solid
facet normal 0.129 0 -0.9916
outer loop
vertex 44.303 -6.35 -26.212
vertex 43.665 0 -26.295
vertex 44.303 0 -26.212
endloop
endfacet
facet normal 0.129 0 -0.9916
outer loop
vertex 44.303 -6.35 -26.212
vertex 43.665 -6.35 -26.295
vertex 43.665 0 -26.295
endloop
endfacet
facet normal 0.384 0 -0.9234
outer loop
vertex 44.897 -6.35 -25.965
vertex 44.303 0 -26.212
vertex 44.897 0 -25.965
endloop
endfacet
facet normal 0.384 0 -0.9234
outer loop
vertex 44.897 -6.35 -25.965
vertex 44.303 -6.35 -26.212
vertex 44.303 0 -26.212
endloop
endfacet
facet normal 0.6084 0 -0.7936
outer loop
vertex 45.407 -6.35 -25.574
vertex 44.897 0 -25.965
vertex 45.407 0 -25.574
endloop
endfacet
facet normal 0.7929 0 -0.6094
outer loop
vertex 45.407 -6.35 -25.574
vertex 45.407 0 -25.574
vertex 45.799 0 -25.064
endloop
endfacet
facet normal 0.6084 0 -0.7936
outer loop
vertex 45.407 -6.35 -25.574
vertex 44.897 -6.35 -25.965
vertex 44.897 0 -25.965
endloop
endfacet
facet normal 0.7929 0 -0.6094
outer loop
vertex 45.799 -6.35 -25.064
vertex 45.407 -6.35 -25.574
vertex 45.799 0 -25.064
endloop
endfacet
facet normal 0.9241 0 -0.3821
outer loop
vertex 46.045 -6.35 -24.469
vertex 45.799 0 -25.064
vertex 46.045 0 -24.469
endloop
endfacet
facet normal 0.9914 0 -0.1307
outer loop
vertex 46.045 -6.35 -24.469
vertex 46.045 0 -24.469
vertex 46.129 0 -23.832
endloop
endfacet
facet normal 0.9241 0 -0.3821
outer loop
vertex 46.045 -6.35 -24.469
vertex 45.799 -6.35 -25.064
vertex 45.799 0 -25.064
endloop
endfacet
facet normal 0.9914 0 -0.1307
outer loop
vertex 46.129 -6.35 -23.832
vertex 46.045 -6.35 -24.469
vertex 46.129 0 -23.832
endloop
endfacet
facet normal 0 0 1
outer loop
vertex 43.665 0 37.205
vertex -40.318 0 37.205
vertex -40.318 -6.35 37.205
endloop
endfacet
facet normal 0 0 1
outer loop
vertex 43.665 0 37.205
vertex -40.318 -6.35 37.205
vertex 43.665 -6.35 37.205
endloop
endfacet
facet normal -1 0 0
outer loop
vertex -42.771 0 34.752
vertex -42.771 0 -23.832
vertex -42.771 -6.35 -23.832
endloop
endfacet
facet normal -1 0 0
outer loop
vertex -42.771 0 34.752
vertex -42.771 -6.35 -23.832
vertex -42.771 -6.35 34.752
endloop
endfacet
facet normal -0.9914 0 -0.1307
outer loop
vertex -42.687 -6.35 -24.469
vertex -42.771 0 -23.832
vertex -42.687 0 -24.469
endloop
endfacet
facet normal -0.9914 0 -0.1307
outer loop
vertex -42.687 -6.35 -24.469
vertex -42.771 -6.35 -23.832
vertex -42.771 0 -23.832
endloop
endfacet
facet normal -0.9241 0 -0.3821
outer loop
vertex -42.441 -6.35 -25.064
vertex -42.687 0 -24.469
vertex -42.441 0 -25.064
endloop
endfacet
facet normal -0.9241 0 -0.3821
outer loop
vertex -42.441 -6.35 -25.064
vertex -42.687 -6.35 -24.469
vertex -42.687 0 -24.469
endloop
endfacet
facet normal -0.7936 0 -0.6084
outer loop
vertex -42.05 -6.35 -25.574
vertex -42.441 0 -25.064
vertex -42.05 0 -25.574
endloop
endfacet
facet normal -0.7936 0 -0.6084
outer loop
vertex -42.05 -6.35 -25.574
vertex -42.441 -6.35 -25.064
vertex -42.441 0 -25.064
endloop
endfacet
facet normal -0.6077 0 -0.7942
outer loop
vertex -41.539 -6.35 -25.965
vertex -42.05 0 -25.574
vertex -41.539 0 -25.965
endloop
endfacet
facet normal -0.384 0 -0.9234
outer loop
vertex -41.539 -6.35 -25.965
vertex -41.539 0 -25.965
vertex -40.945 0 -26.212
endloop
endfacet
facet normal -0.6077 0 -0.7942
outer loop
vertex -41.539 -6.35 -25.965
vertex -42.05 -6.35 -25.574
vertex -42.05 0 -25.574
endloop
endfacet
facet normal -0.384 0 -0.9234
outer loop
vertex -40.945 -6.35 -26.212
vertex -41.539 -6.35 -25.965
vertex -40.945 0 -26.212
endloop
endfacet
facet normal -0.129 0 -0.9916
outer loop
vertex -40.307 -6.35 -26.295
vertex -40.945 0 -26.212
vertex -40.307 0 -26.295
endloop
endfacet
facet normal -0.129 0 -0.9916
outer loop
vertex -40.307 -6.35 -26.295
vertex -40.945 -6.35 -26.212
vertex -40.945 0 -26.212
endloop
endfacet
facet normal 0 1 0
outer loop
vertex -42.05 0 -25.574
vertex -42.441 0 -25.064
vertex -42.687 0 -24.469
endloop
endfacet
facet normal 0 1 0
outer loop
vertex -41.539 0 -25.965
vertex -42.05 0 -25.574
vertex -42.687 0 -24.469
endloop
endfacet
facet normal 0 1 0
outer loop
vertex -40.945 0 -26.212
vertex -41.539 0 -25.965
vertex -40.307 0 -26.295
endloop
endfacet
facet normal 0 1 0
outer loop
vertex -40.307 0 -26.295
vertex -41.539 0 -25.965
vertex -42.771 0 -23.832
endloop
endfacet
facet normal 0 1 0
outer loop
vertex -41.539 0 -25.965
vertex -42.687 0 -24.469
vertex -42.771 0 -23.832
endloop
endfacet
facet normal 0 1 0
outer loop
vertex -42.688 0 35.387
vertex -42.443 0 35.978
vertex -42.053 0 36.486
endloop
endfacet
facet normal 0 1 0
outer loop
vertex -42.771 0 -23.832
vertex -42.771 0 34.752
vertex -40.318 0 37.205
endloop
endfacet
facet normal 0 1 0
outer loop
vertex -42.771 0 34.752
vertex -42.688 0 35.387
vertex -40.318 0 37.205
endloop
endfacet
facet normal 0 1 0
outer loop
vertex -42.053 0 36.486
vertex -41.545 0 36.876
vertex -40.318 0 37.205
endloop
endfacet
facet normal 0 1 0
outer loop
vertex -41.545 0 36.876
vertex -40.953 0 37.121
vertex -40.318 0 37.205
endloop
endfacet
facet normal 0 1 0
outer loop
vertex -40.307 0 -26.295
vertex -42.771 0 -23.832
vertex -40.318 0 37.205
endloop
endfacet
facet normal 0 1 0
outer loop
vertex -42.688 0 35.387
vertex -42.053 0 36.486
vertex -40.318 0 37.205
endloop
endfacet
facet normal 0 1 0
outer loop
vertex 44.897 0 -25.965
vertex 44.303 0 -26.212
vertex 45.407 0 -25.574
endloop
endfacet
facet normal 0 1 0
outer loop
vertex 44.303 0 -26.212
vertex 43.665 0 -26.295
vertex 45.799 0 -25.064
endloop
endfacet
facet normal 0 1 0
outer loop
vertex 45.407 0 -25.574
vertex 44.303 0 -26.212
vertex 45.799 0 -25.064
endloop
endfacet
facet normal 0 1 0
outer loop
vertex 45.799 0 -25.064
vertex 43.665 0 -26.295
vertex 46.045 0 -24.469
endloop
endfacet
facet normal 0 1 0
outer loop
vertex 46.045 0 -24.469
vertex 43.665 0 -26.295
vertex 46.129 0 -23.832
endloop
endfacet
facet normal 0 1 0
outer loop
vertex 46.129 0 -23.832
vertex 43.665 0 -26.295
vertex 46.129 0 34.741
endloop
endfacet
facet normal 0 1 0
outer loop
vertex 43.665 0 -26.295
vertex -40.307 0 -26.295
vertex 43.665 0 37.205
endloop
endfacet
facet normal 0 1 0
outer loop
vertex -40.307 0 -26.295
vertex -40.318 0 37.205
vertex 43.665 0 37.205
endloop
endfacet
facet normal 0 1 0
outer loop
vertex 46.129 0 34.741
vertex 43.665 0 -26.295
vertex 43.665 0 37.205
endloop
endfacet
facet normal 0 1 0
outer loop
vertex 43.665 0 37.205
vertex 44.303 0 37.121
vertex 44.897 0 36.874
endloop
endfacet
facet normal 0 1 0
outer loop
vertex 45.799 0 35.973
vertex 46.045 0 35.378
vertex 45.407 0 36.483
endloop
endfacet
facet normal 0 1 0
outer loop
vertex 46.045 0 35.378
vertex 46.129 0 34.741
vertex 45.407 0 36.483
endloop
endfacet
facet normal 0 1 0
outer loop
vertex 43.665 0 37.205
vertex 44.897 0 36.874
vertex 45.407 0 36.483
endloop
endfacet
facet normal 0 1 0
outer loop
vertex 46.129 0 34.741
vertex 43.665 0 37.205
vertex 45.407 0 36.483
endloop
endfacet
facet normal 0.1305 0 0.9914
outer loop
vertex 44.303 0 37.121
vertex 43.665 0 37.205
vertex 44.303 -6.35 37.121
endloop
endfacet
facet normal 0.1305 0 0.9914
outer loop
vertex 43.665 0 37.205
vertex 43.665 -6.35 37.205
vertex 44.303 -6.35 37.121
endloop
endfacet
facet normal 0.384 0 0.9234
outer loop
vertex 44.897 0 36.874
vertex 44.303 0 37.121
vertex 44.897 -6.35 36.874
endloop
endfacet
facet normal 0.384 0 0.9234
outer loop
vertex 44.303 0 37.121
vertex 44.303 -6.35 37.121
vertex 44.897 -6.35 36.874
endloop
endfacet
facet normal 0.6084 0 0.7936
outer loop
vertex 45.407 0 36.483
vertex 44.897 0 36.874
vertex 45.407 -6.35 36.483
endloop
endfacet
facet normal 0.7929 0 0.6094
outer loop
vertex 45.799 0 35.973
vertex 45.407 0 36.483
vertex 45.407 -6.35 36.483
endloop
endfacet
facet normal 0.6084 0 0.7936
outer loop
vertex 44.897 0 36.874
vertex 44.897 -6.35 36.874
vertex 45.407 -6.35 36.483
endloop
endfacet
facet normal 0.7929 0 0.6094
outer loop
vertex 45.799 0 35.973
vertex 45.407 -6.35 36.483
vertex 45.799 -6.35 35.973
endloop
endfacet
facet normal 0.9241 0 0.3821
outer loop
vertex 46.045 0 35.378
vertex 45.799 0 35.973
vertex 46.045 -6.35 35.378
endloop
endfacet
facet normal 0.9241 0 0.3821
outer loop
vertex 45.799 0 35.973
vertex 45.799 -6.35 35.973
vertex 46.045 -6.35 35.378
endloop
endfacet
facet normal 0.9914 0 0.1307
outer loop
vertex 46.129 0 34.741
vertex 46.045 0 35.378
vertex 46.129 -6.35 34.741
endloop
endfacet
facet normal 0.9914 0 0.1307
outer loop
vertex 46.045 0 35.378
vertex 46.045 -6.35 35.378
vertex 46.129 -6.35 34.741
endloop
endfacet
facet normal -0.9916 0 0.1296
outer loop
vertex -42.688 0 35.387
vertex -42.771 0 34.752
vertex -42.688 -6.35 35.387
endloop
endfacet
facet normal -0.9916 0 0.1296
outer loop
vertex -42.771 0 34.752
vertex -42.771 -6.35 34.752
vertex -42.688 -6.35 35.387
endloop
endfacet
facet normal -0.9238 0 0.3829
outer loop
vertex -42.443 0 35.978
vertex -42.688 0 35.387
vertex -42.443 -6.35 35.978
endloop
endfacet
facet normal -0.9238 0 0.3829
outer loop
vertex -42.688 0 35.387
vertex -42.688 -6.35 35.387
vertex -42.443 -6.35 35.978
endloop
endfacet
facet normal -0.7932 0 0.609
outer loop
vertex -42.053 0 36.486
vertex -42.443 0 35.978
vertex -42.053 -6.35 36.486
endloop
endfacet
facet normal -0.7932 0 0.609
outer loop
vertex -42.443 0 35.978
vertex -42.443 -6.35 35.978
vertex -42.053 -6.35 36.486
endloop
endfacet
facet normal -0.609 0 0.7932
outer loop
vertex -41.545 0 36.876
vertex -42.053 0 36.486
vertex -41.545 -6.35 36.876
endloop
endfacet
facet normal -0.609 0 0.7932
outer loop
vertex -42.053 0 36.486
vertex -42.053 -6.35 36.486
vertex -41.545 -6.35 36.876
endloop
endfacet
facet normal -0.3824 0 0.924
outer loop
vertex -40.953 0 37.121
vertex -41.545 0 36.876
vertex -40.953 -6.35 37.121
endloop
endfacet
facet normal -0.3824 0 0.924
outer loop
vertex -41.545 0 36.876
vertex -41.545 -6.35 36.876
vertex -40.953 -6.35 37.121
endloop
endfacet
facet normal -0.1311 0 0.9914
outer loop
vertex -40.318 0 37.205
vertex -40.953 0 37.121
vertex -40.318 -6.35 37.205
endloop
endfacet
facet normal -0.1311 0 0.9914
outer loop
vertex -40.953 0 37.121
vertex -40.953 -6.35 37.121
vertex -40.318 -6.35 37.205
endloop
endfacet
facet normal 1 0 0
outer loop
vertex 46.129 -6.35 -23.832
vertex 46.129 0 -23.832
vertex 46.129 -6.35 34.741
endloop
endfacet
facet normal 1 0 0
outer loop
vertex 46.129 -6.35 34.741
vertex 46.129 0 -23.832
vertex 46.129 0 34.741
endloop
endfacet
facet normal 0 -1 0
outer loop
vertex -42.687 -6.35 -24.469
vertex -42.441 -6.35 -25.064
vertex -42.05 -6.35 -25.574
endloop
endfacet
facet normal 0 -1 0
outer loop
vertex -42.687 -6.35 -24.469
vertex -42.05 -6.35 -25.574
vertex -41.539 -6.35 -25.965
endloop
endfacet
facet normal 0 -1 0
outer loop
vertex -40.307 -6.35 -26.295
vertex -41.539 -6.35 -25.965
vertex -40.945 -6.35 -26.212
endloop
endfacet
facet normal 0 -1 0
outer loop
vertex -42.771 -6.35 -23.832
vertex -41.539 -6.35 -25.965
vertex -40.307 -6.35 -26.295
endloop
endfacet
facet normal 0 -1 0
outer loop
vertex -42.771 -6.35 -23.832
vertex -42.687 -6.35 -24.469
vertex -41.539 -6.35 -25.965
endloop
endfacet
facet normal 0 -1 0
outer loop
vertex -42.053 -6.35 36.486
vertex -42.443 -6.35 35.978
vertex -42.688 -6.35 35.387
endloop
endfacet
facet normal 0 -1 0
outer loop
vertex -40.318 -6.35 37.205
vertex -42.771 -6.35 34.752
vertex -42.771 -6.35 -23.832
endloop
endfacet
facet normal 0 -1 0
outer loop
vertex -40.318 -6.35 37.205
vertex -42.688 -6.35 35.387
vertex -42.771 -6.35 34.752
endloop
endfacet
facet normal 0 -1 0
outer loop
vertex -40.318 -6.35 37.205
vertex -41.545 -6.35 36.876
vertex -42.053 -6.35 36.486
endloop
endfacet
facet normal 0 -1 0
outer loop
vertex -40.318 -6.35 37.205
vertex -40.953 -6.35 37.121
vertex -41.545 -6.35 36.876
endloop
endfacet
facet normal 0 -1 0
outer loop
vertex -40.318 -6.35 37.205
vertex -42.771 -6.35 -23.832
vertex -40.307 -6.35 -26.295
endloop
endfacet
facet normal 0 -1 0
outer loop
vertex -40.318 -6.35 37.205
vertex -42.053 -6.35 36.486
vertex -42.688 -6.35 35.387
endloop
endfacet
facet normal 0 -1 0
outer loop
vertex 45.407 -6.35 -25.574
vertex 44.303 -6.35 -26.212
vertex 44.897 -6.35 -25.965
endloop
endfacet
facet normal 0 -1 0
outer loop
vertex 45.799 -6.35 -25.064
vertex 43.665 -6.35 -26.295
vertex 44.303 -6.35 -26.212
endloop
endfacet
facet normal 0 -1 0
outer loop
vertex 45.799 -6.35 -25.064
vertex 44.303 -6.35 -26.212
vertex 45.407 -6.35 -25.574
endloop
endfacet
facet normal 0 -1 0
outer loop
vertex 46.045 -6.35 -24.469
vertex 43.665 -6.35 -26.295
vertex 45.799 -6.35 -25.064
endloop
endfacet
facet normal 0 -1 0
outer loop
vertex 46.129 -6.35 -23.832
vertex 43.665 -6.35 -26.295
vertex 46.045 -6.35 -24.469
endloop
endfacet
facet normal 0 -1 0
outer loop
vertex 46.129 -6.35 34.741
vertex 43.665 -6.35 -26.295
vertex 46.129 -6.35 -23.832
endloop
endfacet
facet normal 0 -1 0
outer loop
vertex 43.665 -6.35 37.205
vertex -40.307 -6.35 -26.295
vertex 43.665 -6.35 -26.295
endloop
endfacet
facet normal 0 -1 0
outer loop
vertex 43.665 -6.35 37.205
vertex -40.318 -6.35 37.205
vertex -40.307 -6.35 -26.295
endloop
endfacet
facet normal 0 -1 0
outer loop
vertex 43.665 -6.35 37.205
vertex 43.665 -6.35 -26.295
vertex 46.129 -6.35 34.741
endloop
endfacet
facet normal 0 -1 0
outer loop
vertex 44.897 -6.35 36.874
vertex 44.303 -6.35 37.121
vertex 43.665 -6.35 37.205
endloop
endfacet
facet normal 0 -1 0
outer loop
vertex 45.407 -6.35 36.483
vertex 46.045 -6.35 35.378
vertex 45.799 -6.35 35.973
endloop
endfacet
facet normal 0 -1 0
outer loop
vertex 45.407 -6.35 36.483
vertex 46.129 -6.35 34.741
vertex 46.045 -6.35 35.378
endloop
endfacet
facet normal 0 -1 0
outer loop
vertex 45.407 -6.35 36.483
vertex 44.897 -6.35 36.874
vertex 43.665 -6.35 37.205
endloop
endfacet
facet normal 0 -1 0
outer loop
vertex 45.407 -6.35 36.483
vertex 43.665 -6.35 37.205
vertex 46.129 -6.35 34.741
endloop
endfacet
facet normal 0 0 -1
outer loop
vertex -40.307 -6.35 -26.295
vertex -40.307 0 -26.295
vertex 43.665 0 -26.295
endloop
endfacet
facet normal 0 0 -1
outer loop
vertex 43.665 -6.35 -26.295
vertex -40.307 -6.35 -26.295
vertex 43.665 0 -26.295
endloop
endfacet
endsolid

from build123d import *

# Parameters (mm, degrees)
F0_W     = 88.9
F0_H     = 63.5
F1_DEPTH = 6.35
F2_R     = 2.452841
F3_R     = 2.4638


with BuildPart() as f1:
    # F0 (on Front) → F1 (new body)
    with BuildSketch(Plane.XZ):
        with Locations((1.678722, 5.454515)):
            Rectangle(F0_W, F0_H)
    extrude(amount=F1_DEPTH)

    # F2
    f2_edges = [f1.edges().sort_by_distance(p)[0] for p in [
        (-42.771278, -3.175, 37.204515),
    ]]
    fillet(f2_edges, radius=F2_R)

    # F3
    f3_edges = [f1.edges().sort_by_distance(p)[0] for p in [
        (46.128722, -3.175, 37.204515),
        (-42.771278, -3.175, -26.295485),
        (46.128722, -3.175, -26.295485),
    ]]
    fillet(f3_edges, radius=F3_R)


solid = f1.part
